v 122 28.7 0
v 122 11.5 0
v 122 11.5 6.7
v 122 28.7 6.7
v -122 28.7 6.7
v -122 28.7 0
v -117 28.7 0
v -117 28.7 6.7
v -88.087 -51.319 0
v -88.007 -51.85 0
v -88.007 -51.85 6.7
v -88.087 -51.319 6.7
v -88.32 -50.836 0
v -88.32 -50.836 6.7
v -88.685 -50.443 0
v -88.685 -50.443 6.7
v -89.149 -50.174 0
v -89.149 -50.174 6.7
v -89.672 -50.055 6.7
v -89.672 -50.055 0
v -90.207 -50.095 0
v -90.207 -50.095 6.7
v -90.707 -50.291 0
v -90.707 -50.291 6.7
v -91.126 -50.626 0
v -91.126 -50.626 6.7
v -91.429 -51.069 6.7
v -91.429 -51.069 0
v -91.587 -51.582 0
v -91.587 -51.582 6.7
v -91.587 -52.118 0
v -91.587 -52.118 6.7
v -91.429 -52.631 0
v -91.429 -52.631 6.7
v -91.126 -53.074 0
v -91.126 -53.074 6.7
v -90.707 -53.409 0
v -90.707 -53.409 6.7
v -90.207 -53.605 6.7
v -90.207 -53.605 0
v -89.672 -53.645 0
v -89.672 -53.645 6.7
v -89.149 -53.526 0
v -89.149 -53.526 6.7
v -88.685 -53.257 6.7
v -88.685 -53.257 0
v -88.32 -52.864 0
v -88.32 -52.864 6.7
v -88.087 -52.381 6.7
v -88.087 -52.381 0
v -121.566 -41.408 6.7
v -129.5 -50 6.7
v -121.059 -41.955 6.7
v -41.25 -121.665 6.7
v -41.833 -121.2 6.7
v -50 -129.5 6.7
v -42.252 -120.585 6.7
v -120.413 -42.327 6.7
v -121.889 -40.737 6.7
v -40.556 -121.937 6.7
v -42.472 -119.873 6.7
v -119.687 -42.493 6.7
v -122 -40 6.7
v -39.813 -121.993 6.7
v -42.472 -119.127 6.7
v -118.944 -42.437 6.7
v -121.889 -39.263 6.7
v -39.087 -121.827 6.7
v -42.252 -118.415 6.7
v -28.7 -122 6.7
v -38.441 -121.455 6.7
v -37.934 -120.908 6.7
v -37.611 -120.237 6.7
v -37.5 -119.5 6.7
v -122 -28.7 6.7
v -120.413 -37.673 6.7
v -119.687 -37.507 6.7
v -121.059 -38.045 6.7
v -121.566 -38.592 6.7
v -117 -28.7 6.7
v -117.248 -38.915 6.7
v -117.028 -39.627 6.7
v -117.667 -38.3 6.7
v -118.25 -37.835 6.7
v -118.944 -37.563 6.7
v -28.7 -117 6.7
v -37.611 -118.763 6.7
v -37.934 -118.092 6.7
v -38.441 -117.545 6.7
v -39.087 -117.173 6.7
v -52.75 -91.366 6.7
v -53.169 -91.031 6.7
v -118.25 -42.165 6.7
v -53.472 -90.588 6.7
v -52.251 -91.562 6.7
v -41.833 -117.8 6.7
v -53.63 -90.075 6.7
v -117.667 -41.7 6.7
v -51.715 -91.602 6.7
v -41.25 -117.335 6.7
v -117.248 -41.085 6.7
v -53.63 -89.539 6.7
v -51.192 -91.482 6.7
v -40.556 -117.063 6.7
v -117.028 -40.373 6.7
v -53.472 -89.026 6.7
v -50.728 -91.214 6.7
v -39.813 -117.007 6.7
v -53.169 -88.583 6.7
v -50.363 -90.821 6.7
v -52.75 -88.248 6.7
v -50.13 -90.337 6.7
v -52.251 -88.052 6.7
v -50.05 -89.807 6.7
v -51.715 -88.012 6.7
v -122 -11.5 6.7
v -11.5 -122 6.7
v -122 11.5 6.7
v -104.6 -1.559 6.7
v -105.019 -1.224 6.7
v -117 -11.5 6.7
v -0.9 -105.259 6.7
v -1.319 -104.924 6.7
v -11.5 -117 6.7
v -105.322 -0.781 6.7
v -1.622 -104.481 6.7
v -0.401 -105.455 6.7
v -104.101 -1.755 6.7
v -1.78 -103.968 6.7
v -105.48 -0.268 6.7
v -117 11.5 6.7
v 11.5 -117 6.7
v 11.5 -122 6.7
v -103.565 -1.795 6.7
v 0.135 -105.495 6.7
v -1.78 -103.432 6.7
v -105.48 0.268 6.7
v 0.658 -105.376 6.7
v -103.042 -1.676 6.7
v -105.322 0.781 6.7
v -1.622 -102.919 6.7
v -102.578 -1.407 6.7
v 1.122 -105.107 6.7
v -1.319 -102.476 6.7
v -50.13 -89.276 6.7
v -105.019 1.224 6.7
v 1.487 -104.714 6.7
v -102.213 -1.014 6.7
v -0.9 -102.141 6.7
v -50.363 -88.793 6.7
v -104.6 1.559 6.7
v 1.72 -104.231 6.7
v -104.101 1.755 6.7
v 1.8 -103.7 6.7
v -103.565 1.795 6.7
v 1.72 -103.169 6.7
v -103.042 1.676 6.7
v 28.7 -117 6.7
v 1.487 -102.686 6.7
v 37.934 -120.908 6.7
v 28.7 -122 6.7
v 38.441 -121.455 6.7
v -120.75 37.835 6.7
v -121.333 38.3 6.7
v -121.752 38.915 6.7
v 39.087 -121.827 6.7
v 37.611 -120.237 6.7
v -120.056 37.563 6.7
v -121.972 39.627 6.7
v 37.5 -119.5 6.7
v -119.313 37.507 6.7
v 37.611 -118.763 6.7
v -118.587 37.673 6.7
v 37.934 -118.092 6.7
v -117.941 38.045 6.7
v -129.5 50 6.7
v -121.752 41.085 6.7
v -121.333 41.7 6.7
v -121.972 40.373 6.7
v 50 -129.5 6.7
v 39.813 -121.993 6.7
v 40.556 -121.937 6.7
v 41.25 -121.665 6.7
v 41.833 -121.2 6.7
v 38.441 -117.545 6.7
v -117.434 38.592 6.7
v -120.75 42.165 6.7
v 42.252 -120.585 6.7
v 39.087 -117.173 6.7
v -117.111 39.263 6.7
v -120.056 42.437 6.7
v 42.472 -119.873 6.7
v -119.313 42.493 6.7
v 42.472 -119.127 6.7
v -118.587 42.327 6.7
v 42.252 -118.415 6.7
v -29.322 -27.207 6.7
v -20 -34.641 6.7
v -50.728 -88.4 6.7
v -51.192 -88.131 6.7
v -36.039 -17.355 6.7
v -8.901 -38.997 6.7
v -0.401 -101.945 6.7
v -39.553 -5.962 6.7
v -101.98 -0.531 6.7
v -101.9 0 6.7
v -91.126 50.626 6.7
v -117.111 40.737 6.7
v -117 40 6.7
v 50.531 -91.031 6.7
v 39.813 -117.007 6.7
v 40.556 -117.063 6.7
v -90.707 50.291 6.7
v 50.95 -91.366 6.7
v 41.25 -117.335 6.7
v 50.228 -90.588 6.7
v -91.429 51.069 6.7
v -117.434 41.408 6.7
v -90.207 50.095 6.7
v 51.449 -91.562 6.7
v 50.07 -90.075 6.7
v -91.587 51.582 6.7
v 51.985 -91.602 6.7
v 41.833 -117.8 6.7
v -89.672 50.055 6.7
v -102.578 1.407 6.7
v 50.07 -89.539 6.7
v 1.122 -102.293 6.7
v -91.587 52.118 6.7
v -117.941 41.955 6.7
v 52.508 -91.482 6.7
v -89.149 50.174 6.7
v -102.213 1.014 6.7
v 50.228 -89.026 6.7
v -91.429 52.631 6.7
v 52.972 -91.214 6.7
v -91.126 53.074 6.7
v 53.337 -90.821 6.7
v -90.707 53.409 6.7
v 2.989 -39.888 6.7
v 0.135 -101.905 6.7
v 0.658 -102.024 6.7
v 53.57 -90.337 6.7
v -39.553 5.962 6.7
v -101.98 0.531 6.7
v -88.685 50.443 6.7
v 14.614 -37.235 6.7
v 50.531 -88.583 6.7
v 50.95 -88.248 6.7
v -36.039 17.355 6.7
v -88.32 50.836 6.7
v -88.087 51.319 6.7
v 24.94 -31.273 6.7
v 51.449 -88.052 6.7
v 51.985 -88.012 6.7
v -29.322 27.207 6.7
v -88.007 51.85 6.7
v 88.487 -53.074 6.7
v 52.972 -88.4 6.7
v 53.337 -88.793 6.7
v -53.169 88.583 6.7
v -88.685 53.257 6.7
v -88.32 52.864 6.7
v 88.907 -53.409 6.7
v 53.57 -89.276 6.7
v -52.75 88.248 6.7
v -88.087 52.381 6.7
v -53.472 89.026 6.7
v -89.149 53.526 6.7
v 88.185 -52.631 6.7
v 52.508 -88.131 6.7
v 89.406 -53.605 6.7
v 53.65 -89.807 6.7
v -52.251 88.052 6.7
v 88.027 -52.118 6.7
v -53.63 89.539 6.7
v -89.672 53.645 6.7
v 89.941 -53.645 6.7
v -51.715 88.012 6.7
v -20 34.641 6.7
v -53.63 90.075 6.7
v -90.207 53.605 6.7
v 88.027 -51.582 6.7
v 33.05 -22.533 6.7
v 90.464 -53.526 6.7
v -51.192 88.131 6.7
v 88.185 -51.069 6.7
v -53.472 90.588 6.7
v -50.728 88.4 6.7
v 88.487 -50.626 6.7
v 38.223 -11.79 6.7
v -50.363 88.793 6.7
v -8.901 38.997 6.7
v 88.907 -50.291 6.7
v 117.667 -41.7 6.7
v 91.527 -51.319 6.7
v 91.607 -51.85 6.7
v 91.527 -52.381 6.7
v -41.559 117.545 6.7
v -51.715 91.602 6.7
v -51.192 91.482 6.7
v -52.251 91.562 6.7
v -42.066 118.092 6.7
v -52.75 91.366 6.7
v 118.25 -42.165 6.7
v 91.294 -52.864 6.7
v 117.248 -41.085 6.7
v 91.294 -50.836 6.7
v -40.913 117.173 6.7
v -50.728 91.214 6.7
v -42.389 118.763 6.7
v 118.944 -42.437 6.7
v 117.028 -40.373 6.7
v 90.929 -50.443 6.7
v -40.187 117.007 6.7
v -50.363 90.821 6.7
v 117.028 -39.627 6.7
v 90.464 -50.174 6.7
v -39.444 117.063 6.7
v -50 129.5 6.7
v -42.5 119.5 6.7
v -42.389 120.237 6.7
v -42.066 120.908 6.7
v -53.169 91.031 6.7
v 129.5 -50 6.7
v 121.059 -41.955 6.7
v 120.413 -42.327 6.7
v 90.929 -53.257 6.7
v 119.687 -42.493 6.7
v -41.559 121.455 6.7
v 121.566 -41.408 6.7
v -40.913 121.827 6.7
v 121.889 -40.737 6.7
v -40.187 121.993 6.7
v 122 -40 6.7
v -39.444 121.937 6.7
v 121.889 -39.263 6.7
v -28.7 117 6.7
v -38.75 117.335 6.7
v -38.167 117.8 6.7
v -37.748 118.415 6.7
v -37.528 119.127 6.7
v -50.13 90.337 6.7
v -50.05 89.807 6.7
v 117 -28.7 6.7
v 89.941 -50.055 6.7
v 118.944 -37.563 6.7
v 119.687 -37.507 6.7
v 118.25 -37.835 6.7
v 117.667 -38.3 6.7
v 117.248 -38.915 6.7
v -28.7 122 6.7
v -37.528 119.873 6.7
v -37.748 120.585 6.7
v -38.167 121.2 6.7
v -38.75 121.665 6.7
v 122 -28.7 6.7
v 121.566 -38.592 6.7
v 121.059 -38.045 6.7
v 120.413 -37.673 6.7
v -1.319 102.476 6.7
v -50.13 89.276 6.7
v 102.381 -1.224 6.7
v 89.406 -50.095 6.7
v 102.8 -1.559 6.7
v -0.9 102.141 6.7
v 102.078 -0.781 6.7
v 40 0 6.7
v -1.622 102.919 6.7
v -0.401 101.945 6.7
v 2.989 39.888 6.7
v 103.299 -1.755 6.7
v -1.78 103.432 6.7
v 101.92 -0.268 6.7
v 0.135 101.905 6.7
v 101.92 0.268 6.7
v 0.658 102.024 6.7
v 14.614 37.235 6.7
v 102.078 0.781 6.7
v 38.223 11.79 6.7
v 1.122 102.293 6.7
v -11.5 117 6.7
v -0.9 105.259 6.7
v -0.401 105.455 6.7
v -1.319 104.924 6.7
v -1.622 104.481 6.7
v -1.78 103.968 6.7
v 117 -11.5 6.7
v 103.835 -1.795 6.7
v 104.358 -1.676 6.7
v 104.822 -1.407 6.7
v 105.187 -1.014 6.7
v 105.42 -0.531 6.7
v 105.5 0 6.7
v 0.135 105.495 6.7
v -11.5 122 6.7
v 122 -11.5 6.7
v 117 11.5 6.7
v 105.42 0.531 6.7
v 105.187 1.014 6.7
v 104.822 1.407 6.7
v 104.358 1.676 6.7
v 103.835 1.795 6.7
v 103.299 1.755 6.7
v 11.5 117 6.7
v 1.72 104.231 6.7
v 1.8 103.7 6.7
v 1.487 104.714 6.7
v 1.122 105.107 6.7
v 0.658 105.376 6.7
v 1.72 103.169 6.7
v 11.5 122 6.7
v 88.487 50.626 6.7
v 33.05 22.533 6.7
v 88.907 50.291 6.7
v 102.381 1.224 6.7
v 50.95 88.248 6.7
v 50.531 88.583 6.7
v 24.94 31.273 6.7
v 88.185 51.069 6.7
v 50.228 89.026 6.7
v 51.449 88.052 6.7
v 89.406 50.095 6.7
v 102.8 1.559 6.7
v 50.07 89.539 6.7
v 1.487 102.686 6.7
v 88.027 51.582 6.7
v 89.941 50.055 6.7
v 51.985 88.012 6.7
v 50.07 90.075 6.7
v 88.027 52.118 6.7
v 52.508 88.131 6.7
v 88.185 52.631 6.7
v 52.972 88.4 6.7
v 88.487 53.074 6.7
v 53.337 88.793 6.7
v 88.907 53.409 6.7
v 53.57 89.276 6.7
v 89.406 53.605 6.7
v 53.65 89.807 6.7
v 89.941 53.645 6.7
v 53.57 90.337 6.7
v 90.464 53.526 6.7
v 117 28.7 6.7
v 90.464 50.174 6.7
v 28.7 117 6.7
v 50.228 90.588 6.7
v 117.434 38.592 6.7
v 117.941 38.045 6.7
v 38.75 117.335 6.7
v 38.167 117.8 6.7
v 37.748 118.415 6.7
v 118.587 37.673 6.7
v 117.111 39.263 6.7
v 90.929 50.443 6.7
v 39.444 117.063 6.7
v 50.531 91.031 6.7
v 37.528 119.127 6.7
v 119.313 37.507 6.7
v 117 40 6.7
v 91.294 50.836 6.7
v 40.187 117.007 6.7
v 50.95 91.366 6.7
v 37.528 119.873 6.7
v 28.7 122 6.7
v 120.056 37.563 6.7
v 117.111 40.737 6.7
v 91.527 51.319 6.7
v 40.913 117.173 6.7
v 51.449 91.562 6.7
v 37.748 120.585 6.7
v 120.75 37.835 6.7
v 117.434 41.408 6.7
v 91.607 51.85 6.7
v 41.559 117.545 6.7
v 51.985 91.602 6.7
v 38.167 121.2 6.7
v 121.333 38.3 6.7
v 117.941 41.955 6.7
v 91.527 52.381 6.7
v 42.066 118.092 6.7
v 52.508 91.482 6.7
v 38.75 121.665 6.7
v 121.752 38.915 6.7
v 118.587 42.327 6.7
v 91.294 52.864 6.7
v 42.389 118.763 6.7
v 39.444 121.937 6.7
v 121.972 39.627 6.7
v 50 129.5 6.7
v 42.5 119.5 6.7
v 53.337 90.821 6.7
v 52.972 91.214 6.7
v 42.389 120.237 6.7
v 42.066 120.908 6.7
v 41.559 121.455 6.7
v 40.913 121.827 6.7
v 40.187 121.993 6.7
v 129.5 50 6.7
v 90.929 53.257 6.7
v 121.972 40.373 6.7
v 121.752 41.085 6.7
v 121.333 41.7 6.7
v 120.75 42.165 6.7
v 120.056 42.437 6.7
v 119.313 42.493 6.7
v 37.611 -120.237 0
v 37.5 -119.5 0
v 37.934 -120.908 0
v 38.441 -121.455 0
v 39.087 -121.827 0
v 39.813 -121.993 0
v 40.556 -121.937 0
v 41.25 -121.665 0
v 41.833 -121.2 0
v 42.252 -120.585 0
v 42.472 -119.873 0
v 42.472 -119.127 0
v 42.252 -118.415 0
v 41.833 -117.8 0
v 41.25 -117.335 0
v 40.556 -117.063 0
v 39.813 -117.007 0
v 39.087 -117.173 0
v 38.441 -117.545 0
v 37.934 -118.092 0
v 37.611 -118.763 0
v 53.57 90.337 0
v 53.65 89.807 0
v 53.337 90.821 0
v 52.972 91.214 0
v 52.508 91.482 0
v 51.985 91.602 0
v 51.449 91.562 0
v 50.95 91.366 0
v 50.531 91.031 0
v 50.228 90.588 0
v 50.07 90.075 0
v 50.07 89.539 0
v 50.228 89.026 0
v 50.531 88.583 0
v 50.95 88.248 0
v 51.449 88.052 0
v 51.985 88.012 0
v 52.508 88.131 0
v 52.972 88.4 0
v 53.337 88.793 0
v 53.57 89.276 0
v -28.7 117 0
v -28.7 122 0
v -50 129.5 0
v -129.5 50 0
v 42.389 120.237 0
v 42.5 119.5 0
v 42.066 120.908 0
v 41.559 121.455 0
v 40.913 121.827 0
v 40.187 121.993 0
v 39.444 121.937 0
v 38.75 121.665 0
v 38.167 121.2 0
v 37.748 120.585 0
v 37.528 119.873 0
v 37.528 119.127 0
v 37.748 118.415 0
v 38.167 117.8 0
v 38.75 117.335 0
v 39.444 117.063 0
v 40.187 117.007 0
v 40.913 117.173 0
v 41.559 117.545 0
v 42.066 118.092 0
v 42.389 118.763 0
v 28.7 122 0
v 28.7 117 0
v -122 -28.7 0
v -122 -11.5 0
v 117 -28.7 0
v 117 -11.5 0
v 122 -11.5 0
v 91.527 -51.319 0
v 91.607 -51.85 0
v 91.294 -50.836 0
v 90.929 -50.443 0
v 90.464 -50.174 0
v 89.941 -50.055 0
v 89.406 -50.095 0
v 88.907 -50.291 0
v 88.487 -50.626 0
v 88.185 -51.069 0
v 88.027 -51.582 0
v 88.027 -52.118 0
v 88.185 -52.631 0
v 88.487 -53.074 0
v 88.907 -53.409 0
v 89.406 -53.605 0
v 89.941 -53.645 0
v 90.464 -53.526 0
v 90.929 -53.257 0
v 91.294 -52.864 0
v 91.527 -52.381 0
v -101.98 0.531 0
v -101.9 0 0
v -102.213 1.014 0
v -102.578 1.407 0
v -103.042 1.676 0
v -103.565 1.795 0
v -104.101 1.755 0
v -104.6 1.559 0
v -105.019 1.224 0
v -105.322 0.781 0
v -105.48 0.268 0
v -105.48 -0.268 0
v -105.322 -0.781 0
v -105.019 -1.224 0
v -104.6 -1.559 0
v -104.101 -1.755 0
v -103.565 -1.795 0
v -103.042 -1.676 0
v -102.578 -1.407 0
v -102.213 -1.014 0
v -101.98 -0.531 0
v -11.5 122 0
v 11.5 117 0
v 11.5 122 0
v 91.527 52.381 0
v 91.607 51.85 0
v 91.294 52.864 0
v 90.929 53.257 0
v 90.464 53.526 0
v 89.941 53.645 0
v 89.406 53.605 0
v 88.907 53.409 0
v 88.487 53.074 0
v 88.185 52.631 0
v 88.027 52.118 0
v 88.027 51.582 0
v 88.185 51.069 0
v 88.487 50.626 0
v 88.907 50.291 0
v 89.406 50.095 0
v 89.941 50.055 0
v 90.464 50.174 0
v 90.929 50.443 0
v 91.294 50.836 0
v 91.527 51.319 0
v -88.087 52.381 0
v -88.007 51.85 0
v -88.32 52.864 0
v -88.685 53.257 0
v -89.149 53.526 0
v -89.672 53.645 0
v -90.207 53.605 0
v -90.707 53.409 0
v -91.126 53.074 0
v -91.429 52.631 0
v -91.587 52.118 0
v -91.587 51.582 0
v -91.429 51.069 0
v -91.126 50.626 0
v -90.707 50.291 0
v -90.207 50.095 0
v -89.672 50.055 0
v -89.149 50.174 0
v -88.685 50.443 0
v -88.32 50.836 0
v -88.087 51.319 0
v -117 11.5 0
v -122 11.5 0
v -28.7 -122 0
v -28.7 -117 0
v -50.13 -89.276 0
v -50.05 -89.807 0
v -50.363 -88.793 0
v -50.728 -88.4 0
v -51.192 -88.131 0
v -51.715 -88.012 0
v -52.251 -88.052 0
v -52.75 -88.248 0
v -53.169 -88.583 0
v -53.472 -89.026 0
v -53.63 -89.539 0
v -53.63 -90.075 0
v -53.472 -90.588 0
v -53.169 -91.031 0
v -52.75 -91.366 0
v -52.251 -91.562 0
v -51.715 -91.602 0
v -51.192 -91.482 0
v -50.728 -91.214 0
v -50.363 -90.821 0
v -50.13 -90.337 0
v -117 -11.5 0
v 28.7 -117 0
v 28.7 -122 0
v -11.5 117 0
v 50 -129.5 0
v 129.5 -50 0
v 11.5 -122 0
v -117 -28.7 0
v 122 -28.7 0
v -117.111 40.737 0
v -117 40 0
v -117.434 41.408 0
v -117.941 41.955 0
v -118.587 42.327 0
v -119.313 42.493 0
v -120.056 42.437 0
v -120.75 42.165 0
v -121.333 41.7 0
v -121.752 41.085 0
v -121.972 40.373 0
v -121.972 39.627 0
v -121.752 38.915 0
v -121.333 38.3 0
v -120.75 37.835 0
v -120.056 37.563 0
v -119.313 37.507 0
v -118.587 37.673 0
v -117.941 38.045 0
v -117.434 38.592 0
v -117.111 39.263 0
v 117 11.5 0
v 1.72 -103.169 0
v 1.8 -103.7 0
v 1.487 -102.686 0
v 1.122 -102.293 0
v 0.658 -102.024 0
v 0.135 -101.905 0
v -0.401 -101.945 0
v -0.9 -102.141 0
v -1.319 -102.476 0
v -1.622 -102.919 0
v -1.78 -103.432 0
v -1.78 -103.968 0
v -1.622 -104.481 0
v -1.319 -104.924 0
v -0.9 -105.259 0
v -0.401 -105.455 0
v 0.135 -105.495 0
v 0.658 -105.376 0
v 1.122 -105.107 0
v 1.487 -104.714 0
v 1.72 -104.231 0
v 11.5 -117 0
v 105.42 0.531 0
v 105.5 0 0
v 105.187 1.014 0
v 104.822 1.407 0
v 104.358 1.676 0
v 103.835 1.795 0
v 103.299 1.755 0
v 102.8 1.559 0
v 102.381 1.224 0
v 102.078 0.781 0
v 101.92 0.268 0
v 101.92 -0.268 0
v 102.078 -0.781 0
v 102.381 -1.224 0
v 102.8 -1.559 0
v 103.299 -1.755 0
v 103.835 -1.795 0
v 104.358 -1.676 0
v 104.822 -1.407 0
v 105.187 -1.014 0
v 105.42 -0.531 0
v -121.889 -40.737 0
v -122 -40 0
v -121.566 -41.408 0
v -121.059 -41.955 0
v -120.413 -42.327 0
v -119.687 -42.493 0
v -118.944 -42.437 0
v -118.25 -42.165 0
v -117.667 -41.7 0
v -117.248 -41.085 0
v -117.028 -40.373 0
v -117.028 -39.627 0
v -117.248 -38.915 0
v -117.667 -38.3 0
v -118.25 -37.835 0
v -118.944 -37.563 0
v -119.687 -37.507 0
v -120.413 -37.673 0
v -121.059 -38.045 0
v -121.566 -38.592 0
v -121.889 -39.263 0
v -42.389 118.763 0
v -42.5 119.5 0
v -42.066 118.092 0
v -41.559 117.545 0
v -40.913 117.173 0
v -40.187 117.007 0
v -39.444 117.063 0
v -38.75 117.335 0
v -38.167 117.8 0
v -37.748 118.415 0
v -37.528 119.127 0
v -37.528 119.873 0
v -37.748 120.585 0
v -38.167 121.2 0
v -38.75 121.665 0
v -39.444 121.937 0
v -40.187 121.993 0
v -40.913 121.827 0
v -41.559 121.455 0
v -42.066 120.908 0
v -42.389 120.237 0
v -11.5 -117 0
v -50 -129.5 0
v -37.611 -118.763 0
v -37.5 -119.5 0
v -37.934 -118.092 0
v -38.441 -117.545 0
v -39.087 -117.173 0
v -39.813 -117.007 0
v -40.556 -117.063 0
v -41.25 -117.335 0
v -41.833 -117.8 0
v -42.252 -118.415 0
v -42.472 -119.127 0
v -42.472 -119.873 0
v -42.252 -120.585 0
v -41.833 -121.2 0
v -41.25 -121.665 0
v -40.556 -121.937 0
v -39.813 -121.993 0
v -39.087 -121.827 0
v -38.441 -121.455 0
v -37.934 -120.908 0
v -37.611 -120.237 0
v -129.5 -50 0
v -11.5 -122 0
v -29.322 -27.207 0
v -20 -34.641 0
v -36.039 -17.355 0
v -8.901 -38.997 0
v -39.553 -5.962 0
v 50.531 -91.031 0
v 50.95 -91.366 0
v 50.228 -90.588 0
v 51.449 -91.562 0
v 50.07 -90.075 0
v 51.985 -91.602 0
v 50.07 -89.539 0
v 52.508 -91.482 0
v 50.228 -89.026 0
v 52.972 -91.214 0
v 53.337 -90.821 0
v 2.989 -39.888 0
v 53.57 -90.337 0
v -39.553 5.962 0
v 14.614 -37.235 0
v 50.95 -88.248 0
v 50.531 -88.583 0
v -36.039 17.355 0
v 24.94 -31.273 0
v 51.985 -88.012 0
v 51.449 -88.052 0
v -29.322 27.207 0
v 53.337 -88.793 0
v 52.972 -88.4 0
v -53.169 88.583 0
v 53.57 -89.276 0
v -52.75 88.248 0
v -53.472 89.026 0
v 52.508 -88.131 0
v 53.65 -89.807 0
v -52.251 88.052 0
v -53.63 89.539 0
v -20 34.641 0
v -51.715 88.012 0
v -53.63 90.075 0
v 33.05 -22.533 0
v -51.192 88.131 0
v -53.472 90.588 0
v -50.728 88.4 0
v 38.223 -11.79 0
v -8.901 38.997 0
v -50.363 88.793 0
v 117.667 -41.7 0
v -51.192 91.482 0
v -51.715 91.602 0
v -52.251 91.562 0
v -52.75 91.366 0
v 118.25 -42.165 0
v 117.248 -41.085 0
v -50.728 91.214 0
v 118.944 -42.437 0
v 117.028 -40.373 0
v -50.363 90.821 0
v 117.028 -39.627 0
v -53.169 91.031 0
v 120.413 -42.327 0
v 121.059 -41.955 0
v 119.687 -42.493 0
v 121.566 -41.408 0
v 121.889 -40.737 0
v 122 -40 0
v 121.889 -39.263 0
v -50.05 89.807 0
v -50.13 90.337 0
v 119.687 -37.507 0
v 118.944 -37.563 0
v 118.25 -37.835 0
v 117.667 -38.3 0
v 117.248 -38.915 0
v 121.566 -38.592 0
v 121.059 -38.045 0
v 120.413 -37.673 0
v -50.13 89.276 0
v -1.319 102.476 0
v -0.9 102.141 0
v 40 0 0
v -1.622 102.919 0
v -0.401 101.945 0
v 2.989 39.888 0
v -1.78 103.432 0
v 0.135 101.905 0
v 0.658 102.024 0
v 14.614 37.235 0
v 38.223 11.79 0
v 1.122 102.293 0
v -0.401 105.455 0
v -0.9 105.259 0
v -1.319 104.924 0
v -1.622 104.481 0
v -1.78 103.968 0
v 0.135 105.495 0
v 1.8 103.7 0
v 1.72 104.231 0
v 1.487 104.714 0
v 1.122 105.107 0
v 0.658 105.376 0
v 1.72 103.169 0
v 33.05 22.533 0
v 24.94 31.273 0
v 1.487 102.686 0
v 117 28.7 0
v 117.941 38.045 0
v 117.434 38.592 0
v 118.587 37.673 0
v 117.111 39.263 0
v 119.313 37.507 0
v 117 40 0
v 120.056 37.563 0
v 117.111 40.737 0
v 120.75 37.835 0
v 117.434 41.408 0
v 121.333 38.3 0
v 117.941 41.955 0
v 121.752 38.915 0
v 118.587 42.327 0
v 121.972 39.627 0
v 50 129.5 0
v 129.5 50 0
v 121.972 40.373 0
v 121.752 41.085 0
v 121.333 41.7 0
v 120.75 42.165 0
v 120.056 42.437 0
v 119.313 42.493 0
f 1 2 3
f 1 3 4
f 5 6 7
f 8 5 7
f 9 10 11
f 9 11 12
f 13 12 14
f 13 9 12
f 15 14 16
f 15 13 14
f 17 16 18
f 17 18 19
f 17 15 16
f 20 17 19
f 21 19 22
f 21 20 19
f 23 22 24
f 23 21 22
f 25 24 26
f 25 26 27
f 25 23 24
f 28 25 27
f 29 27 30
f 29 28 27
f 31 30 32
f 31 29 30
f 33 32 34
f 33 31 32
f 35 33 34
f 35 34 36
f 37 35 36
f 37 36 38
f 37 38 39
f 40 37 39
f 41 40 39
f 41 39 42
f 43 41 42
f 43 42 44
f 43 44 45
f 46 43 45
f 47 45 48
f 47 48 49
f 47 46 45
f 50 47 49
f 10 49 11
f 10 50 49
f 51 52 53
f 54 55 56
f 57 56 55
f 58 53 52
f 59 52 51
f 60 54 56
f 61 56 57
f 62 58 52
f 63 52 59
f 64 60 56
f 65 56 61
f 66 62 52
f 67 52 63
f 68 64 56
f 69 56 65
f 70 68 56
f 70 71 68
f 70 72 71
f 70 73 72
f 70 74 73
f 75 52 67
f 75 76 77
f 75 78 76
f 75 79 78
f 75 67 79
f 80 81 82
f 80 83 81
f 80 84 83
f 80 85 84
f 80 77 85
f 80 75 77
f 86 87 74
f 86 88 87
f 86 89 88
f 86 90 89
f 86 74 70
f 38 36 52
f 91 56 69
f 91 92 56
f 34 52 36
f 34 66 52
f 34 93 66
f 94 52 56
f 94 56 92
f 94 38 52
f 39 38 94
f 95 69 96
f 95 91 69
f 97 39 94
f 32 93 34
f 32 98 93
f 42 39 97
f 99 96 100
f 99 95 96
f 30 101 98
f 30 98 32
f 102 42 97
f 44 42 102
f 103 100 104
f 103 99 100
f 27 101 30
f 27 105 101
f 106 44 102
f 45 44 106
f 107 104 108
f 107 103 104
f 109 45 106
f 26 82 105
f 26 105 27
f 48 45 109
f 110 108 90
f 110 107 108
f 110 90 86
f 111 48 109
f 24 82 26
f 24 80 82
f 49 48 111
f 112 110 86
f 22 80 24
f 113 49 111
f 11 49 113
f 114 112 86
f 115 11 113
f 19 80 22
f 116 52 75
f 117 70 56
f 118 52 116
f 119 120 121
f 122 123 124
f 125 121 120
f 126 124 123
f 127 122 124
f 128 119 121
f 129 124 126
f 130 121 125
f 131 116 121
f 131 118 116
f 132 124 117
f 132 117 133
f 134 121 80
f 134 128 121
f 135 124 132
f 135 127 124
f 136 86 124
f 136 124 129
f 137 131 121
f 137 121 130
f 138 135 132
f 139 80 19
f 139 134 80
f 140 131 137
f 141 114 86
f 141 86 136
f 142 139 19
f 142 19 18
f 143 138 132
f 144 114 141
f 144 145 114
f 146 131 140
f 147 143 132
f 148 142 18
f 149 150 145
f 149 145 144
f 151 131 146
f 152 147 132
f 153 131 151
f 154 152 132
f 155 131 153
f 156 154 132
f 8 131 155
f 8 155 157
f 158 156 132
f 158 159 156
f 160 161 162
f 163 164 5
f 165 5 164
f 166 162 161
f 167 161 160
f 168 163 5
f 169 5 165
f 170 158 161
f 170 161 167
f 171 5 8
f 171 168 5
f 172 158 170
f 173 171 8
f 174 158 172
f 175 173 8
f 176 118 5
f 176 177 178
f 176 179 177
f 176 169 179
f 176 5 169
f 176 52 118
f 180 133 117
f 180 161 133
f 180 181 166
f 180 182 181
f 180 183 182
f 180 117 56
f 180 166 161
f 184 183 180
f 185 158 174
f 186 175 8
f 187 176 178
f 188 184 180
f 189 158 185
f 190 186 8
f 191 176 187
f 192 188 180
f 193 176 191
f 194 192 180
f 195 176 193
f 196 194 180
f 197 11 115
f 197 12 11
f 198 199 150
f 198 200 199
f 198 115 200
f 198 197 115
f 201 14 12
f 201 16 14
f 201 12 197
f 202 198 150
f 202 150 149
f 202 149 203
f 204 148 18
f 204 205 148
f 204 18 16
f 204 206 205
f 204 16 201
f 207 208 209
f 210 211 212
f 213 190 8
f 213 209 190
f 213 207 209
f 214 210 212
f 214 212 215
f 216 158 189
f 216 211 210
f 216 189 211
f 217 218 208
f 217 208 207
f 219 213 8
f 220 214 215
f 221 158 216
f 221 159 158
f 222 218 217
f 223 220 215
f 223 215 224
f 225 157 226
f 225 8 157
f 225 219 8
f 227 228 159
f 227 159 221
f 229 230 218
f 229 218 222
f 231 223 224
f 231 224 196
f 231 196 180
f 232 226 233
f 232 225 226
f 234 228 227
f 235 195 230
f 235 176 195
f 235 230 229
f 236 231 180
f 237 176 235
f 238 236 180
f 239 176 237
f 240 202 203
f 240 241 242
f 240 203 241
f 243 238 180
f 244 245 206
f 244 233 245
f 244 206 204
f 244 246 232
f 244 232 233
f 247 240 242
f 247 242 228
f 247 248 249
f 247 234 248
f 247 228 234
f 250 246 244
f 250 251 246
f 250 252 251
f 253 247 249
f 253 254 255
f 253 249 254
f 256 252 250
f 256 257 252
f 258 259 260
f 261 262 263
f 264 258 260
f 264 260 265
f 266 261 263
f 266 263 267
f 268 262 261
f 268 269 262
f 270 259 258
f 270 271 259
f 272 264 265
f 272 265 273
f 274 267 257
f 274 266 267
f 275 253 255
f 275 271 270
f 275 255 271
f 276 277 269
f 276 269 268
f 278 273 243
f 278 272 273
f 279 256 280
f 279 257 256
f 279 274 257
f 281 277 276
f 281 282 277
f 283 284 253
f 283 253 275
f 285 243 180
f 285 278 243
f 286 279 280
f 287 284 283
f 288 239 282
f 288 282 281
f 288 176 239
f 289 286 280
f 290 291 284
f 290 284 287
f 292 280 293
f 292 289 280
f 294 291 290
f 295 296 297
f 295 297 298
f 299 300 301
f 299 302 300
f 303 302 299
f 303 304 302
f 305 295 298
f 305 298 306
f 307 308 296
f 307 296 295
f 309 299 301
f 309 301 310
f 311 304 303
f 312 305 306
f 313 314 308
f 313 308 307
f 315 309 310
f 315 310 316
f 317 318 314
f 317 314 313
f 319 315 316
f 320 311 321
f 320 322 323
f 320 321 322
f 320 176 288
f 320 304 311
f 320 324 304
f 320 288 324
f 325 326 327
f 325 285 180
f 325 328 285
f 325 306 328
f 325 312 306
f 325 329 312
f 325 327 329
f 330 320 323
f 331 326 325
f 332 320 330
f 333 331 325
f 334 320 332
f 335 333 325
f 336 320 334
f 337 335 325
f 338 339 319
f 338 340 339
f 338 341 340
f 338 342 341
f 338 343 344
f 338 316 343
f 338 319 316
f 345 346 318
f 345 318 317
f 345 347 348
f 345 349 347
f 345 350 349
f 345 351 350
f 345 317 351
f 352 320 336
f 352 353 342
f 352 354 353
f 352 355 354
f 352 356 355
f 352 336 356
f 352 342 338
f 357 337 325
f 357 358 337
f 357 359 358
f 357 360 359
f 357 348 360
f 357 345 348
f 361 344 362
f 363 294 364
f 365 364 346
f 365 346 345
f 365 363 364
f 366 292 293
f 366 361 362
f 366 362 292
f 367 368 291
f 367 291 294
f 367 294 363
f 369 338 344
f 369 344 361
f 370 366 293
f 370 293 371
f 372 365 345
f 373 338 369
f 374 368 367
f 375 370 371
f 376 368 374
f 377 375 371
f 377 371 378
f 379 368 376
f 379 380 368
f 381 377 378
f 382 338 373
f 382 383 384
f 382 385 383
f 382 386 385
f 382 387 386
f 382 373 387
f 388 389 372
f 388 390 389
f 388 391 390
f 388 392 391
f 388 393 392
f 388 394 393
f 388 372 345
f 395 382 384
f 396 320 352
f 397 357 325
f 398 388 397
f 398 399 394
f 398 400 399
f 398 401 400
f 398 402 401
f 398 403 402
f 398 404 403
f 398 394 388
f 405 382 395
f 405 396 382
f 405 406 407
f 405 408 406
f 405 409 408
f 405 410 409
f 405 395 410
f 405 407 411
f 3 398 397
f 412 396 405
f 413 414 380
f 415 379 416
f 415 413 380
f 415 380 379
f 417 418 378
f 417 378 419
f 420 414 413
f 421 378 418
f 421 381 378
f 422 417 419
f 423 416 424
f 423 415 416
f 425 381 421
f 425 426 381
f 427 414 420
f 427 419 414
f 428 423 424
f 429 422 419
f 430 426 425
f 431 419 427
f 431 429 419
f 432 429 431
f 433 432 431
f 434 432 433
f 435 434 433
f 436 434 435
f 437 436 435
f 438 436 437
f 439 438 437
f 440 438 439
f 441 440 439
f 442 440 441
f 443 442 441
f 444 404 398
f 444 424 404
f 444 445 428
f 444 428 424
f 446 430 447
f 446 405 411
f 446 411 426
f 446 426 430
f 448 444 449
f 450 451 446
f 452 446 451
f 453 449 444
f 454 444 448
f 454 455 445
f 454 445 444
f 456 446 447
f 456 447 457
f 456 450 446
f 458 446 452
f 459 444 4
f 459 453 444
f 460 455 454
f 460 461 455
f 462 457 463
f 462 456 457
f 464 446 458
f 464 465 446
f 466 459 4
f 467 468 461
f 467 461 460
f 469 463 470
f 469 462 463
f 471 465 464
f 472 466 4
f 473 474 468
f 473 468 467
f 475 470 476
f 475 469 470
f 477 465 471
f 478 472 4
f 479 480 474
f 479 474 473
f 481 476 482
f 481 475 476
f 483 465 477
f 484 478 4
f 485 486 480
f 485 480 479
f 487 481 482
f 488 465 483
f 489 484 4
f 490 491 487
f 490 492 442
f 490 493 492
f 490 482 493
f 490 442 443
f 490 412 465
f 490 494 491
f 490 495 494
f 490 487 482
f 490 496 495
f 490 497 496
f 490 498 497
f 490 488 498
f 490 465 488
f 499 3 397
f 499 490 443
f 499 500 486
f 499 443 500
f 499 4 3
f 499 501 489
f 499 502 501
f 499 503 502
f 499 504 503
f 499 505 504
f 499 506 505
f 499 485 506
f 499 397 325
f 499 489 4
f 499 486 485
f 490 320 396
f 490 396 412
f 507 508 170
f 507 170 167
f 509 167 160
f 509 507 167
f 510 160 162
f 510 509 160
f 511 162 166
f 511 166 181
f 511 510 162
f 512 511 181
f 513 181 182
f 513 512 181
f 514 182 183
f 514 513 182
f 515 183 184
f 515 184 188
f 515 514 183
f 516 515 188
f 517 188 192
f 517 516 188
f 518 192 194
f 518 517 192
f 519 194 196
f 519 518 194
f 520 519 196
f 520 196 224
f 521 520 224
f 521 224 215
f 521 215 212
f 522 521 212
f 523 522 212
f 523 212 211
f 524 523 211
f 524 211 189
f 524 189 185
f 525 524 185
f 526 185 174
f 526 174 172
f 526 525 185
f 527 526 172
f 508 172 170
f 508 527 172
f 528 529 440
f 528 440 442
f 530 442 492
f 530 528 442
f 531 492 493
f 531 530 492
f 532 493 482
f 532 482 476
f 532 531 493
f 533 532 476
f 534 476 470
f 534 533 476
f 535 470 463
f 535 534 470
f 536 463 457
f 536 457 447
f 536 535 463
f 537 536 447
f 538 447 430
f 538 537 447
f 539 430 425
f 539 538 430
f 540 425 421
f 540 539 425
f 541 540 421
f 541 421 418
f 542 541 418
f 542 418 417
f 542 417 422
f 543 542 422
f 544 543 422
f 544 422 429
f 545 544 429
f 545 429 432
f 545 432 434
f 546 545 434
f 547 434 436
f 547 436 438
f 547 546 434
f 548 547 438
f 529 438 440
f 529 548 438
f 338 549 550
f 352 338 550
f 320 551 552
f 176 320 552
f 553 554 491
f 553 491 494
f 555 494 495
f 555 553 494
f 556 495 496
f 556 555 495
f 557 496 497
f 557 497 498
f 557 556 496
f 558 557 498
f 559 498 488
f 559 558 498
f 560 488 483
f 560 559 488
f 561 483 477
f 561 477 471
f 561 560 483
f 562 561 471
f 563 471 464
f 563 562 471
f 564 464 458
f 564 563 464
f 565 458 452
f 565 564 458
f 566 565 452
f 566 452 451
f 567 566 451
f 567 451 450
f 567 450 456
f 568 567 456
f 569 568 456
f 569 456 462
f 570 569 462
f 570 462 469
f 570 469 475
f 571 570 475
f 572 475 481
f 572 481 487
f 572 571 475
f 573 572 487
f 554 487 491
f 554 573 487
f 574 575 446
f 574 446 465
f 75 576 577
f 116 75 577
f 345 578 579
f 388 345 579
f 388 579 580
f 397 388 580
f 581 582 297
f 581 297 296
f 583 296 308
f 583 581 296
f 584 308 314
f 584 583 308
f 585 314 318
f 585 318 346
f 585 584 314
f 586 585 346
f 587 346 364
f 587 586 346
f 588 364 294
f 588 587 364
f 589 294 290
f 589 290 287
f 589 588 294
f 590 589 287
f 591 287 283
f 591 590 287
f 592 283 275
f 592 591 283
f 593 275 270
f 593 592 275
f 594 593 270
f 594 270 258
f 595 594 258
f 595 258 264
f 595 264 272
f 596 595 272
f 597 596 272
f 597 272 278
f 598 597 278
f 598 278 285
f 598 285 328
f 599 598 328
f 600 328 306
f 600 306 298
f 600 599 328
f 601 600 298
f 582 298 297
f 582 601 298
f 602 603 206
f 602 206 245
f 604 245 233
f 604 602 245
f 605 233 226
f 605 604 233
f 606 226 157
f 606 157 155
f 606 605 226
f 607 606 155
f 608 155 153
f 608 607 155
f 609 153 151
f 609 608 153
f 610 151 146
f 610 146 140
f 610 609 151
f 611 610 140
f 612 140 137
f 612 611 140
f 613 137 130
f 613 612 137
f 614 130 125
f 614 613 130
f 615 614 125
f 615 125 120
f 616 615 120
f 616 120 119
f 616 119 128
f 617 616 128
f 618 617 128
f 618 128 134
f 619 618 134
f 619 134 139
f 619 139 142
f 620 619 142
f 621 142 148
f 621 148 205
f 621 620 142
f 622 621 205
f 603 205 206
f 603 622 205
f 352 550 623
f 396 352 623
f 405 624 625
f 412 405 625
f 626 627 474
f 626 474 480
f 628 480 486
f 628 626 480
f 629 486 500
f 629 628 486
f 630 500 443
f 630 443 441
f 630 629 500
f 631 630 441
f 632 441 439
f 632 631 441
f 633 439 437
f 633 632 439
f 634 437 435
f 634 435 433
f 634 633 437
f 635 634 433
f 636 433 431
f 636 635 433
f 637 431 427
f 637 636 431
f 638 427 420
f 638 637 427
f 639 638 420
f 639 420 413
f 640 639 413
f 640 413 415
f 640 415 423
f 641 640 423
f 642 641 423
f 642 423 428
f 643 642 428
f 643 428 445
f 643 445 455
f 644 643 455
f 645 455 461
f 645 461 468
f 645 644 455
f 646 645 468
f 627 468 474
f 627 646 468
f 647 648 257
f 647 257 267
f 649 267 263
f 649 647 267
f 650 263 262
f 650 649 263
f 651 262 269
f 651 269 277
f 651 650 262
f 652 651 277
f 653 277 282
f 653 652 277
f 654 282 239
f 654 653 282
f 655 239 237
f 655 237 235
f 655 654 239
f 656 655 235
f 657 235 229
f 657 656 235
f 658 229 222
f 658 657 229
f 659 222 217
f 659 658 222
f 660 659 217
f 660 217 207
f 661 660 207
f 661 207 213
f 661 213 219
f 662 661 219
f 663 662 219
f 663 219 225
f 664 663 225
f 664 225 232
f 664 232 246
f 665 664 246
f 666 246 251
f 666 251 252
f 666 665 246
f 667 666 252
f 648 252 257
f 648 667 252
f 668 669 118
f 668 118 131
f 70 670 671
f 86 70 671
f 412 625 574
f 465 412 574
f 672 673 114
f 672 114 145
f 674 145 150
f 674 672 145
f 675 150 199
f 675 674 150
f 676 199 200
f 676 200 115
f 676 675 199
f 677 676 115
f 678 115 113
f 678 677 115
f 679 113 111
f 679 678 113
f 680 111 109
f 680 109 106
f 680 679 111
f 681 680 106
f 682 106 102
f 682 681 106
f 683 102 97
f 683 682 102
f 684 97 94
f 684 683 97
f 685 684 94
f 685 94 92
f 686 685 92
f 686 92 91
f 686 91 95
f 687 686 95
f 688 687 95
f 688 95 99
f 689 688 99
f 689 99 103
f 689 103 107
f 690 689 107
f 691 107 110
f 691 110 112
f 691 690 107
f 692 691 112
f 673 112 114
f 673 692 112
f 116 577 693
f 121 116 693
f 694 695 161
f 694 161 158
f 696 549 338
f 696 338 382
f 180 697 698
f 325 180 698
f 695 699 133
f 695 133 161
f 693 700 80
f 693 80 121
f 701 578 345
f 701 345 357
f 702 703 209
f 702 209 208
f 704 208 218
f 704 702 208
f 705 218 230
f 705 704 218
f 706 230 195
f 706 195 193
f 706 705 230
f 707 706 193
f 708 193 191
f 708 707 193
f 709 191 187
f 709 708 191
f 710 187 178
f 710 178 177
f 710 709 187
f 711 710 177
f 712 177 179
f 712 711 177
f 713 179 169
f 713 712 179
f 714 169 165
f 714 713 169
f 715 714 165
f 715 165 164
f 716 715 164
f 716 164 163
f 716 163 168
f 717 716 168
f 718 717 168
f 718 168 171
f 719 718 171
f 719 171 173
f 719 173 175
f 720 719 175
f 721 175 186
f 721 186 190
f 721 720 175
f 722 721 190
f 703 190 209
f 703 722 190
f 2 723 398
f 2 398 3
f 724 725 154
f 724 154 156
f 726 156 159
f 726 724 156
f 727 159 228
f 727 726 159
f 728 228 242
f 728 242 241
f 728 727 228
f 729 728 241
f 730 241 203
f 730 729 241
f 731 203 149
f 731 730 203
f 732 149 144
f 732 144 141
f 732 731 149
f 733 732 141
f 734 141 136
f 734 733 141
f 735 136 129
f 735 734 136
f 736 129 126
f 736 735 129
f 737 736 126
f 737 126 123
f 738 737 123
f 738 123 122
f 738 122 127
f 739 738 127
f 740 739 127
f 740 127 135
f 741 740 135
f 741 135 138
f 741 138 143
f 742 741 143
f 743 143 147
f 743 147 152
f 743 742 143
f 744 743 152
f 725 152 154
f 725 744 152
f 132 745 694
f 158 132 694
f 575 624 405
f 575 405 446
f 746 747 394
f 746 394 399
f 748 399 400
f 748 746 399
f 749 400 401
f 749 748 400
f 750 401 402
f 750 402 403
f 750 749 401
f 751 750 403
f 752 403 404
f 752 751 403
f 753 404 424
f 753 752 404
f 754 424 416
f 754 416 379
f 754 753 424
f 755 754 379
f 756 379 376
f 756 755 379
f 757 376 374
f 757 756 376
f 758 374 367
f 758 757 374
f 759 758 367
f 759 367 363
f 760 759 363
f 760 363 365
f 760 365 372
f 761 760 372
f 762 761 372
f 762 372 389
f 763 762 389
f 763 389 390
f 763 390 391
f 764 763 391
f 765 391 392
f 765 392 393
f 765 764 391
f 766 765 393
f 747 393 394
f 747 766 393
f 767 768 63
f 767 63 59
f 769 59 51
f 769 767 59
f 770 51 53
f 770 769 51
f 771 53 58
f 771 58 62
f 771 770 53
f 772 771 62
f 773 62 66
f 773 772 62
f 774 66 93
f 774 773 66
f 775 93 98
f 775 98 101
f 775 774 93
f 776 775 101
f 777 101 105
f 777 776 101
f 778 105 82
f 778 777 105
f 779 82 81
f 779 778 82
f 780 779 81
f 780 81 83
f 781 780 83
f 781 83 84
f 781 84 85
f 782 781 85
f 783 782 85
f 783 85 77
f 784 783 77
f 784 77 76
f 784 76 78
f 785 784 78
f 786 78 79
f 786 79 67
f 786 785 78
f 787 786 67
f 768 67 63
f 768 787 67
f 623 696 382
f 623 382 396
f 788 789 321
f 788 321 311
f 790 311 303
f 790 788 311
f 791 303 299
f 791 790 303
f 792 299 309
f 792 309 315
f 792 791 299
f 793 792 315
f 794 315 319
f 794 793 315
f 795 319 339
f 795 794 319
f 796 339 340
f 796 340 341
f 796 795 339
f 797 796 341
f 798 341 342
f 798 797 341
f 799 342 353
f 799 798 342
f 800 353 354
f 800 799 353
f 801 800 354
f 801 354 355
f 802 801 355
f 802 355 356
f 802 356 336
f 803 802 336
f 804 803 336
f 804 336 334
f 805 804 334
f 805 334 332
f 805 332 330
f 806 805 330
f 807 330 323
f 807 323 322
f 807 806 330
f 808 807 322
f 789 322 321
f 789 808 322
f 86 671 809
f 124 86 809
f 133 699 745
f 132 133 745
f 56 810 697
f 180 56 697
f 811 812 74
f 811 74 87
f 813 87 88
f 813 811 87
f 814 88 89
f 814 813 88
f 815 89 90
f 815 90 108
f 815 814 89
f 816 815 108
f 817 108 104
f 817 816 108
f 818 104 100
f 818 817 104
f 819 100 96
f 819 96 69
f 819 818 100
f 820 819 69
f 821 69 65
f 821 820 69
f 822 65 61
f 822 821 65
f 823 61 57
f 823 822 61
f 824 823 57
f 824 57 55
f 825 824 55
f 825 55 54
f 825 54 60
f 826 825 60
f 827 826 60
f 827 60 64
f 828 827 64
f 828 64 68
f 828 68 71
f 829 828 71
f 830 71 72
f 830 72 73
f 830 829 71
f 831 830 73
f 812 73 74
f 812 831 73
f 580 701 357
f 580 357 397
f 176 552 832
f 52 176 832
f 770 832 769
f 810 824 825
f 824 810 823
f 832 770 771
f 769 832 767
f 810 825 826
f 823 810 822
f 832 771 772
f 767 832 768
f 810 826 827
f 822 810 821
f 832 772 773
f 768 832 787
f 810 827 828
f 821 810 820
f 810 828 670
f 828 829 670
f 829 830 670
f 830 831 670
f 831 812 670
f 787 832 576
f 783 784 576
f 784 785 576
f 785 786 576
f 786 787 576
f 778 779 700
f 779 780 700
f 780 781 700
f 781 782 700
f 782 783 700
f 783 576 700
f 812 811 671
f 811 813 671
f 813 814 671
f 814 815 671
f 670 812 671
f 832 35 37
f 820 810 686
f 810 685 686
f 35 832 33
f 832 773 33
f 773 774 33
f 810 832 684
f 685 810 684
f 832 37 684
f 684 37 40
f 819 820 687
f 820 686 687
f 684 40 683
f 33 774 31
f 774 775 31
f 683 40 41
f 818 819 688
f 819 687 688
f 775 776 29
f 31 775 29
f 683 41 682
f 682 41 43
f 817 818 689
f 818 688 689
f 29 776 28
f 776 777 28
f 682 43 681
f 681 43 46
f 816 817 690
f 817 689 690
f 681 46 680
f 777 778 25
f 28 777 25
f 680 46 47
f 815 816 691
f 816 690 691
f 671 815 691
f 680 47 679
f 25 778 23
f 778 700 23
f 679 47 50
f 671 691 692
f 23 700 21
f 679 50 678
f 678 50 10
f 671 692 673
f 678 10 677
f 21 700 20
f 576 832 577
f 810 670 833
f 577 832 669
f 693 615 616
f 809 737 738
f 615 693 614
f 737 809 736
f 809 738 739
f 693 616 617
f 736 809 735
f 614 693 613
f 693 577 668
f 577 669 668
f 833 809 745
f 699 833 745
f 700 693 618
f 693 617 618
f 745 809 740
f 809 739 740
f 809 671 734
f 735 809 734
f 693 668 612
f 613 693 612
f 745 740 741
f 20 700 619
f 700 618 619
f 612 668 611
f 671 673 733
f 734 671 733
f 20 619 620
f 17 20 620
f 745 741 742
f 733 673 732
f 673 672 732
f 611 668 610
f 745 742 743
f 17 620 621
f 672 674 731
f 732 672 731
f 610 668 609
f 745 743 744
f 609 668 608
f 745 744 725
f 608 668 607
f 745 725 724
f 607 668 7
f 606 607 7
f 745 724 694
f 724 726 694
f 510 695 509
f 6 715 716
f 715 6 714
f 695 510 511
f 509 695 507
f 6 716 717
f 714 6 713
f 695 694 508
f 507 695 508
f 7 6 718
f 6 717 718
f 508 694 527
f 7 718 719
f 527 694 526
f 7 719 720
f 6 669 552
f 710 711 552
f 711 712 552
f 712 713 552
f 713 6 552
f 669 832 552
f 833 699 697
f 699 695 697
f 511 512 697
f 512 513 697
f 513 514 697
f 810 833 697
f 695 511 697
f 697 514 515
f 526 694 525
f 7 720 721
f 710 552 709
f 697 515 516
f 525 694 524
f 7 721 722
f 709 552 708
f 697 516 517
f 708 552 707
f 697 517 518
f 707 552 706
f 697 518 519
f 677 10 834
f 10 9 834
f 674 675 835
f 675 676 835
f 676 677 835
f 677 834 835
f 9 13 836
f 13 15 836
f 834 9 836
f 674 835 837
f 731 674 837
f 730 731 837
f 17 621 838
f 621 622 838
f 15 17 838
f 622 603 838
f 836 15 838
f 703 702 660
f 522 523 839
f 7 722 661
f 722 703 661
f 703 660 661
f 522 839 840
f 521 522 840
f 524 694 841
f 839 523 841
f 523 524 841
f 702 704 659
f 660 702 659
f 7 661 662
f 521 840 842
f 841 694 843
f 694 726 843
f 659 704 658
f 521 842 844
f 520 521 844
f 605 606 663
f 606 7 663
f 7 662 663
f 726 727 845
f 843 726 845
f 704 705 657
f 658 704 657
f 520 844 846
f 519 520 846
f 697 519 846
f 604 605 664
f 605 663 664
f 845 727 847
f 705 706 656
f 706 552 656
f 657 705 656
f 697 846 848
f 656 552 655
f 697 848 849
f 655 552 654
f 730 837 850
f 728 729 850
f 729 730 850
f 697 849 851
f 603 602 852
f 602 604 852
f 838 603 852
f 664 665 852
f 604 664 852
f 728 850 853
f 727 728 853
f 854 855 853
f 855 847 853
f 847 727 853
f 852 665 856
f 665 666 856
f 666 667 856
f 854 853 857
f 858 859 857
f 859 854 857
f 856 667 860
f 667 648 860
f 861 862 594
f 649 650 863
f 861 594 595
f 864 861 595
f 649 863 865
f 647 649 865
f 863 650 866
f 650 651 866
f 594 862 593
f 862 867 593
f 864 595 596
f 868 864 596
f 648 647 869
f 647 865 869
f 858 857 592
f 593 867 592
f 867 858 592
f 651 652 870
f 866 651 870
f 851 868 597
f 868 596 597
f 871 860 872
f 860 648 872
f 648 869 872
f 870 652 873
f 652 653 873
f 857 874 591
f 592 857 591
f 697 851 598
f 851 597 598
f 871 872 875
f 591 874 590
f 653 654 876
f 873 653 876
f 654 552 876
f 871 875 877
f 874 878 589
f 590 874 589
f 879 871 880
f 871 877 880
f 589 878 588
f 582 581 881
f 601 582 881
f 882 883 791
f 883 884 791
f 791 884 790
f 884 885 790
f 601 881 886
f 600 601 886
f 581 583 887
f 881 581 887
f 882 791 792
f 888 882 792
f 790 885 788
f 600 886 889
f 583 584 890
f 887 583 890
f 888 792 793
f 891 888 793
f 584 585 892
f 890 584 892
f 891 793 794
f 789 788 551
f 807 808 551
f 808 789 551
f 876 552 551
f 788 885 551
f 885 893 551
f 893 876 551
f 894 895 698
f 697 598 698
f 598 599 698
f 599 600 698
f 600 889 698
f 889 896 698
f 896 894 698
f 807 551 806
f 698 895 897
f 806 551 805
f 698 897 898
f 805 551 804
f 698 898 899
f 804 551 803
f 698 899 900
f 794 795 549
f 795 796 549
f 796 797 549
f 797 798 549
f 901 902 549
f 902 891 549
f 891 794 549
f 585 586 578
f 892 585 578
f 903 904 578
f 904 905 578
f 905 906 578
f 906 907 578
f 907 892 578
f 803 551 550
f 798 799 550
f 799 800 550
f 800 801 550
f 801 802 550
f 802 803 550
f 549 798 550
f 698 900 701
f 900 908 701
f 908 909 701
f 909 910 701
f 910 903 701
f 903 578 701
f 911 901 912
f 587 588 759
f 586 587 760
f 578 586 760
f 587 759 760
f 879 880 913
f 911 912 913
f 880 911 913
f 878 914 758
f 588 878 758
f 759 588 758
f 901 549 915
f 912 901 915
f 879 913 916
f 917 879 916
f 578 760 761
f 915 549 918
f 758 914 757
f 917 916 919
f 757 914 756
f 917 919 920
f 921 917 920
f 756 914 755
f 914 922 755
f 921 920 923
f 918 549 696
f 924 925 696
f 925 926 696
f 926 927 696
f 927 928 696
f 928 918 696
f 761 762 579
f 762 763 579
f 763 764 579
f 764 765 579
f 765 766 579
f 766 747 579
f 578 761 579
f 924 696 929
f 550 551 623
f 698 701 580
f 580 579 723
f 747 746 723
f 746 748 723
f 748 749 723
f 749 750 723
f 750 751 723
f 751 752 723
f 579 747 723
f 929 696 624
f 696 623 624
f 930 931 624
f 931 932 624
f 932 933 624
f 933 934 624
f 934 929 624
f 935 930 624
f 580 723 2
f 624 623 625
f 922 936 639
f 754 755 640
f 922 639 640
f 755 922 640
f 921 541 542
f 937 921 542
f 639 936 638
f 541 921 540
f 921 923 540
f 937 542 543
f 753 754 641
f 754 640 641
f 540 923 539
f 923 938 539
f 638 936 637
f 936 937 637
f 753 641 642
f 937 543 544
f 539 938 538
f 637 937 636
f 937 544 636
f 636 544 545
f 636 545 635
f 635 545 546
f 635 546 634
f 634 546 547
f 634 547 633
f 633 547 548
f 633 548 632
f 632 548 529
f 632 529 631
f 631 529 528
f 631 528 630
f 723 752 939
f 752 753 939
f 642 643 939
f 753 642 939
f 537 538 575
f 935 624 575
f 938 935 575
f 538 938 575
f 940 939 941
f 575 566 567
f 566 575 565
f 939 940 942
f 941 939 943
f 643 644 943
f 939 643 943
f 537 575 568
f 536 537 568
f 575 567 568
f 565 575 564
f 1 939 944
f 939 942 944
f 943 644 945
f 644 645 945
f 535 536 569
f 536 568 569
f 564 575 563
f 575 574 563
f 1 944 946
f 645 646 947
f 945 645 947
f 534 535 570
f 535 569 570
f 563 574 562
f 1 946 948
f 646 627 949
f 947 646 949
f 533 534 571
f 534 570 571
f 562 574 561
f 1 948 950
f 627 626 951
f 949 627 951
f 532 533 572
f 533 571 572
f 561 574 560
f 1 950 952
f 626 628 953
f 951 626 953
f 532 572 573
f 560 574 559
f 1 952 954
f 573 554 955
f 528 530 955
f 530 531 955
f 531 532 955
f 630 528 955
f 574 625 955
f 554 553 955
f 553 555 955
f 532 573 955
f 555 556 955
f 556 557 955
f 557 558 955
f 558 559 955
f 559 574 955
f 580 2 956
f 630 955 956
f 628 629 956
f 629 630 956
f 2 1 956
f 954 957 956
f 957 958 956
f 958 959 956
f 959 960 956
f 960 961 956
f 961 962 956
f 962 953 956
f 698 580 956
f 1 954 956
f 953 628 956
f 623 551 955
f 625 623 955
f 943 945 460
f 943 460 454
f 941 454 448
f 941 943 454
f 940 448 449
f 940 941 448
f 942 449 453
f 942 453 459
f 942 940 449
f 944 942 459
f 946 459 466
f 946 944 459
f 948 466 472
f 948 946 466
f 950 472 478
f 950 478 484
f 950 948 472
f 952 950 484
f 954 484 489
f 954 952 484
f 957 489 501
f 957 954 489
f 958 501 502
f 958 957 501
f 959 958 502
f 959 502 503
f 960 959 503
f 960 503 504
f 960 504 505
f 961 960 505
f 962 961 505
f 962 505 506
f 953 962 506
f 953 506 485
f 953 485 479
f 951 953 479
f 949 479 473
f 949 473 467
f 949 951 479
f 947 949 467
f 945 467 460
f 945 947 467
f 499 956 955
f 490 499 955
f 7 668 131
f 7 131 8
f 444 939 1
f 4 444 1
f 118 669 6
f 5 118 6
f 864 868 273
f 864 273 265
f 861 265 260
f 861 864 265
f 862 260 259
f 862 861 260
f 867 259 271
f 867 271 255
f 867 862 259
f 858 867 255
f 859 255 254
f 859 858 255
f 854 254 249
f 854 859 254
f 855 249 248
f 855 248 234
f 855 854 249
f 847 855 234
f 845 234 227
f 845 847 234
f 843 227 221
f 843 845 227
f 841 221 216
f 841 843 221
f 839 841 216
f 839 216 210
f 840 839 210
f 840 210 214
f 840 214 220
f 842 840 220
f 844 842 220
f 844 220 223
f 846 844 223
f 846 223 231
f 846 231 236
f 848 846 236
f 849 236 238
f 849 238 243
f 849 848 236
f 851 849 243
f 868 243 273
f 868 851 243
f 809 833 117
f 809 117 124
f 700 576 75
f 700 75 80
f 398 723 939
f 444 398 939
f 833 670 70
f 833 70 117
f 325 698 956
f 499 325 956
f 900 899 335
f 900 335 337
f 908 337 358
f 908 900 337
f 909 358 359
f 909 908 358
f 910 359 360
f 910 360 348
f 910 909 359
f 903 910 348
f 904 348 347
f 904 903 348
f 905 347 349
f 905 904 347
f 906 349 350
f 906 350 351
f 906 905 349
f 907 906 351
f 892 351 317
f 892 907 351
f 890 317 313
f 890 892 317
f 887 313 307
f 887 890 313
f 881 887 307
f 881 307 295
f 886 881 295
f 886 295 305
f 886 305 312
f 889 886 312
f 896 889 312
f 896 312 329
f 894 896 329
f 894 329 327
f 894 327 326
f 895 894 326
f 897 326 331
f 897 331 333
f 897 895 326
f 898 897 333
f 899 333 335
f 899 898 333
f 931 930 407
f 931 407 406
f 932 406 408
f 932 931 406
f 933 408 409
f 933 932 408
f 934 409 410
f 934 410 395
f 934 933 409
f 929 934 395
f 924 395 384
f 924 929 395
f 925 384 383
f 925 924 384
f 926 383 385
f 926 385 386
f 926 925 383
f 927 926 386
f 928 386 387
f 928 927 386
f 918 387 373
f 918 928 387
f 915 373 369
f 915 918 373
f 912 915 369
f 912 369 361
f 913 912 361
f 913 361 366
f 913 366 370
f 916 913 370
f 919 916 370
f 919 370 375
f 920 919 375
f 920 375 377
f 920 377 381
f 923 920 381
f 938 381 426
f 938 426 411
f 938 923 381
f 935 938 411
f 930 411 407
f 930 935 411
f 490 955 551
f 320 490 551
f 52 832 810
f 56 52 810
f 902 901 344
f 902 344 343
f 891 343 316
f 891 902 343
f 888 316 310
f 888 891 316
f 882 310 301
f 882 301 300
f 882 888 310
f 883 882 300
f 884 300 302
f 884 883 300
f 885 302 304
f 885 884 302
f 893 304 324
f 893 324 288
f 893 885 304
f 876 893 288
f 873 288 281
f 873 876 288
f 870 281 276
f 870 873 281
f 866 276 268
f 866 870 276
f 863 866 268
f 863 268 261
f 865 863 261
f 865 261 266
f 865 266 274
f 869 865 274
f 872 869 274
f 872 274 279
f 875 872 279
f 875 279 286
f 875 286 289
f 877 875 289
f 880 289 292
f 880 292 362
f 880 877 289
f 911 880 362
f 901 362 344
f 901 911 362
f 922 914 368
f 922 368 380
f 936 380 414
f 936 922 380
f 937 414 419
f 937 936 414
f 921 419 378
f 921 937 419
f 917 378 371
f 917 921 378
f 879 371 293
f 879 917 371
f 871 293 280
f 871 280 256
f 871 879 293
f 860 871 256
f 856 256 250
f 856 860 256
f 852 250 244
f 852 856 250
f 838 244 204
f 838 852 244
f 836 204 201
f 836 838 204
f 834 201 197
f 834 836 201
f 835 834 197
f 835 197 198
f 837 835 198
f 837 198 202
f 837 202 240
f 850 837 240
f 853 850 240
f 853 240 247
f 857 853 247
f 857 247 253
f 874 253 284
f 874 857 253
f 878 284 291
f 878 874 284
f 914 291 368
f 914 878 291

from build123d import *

# Parameters (mm, degrees)
SKETCH1_R           = 109.5
SKETCH1_R_2         = 40
SKETCH1_R_3         = 1.8
BOSS_EXTRUDE1_DEPTH = 6.7
SKETCH4_R           = 109.5
SKETCH4_R_2         = 2.5
SKETCH4_W           = 17.2
SKETCH4_H           = 5
SKETCH4_W_2         = 5
SKETCH4_H_2         = 17.2
BOSS_EXTRUDE2_DEPTH = 6.7


with BuildPart() as part:
    # Sketch1 → Boss-Extrude1 (new body)
    with BuildSketch(Plane.XY):
        Circle(SKETCH1_R)
        Circle(SKETCH1_R_2, mode=Mode.SUBTRACT)
        with Locations((0, 103.7)):
            Circle(SKETCH1_R_3, mode=Mode.SUBTRACT)
        with Locations((51.85, 89.806834372)):
            Circle(SKETCH1_R_3, mode=Mode.SUBTRACT)
        with Locations((89.806834372, 51.85)):
            Circle(SKETCH1_R_3, mode=Mode.SUBTRACT)
        with Locations((103.7, 0)):
            Circle(SKETCH1_R_3, mode=Mode.SUBTRACT)
        with Locations((89.806834372, -51.85)):
            Circle(SKETCH1_R_3, mode=Mode.SUBTRACT)
        with Locations((51.85, -89.806834372)):
            Circle(SKETCH1_R_3, mode=Mode.SUBTRACT)
        with Locations((0, -103.7)):
            Circle(SKETCH1_R_3, mode=Mode.SUBTRACT)
        with Locations((-51.85, -89.806834372)):
            Circle(SKETCH1_R_3, mode=Mode.SUBTRACT)
        with Locations((-89.806834372, -51.85)):
            Circle(SKETCH1_R_3, mode=Mode.SUBTRACT)
        with Locations((-103.7, 0)):
            Circle(SKETCH1_R_3, mode=Mode.SUBTRACT)
        with Locations((-89.806834372, 51.85)):
            Circle(SKETCH1_R_3, mode=Mode.SUBTRACT)
        with Locations((-51.85, 89.806834372)):
            Circle(SKETCH1_R_3, mode=Mode.SUBTRACT)
    extrude(amount=BOSS_EXTRUDE1_DEPTH)

    # Sketch4 → Boss-Extrude2 (add)
    with BuildSketch(Plane.XY):
        Polygon((50, 129.5), (-50, 129.5), (-129.5, 50), (-129.5, -50), (-50, -129.5), (50, -129.5), (129.5, -50), (129.5, 50), align=None)
        Circle(SKETCH4_R, mode=Mode.SUBTRACT)
        with Locations((40, 119.5)):
            Circle(SKETCH4_R_2, mode=Mode.SUBTRACT)
        with Locations(Location((-40, 119.5, 0), (0, 0, 180))):
            Circle(SKETCH4_R_2, mode=Mode.SUBTRACT)
        with Locations(Location((119.5, 40, 0), (0, 0, 180))):
            Circle(SKETCH4_R_2, mode=Mode.SUBTRACT)
        with Locations((119.5, -40)):
            Circle(SKETCH4_R_2, mode=Mode.SUBTRACT)
        with Locations(Location((40, -119.5, 0), (0, 0, 180))):
            Circle(SKETCH4_R_2, mode=Mode.SUBTRACT)
        with Locations((-40, -119.5)):
            Circle(SKETCH4_R_2, mode=Mode.SUBTRACT)
        with Locations(Location((-119.5, -40, 0), (0, 0, 180))):
            Circle(SKETCH4_R_2, mode=Mode.SUBTRACT)
        with Locations((-119.5, 40)):
            Circle(SKETCH4_R_2, mode=Mode.SUBTRACT)
        with Locations((20.1, 119.5)):
            Rectangle(SKETCH4_W, SKETCH4_H, mode=Mode.SUBTRACT)
        with Locations((-20.1, 119.5)):
            Rectangle(SKETCH4_W, SKETCH4_H, mode=Mode.SUBTRACT)
        with Locations((119.5, 20.1)):
            Rectangle(SKETCH4_W_2, SKETCH4_H_2, mode=Mode.SUBTRACT)
        with Locations((119.5, -20.1)):
            Rectangle(SKETCH4_W_2, SKETCH4_H_2, mode=Mode.SUBTRACT)
        with Locations((20.1, -119.5)):
            Rectangle(SKETCH4_W, SKETCH4_H, mode=Mode.SUBTRACT)
        with Locations((-20.1, -119.5)):
            Rectangle(SKETCH4_W, SKETCH4_H, mode=Mode.SUBTRACT)
        with Locations((-119.5, -20.1)):
            Rectangle(SKETCH4_W_2, SKETCH4_H_2, mode=Mode.SUBTRACT)
        with Locations((-119.5, 20.1)):
            Rectangle(SKETCH4_W_2, SKETCH4_H_2, mode=Mode.SUBTRACT)
    extrude(amount=BOSS_EXTRUDE2_DEPTH)


solid = part.part
